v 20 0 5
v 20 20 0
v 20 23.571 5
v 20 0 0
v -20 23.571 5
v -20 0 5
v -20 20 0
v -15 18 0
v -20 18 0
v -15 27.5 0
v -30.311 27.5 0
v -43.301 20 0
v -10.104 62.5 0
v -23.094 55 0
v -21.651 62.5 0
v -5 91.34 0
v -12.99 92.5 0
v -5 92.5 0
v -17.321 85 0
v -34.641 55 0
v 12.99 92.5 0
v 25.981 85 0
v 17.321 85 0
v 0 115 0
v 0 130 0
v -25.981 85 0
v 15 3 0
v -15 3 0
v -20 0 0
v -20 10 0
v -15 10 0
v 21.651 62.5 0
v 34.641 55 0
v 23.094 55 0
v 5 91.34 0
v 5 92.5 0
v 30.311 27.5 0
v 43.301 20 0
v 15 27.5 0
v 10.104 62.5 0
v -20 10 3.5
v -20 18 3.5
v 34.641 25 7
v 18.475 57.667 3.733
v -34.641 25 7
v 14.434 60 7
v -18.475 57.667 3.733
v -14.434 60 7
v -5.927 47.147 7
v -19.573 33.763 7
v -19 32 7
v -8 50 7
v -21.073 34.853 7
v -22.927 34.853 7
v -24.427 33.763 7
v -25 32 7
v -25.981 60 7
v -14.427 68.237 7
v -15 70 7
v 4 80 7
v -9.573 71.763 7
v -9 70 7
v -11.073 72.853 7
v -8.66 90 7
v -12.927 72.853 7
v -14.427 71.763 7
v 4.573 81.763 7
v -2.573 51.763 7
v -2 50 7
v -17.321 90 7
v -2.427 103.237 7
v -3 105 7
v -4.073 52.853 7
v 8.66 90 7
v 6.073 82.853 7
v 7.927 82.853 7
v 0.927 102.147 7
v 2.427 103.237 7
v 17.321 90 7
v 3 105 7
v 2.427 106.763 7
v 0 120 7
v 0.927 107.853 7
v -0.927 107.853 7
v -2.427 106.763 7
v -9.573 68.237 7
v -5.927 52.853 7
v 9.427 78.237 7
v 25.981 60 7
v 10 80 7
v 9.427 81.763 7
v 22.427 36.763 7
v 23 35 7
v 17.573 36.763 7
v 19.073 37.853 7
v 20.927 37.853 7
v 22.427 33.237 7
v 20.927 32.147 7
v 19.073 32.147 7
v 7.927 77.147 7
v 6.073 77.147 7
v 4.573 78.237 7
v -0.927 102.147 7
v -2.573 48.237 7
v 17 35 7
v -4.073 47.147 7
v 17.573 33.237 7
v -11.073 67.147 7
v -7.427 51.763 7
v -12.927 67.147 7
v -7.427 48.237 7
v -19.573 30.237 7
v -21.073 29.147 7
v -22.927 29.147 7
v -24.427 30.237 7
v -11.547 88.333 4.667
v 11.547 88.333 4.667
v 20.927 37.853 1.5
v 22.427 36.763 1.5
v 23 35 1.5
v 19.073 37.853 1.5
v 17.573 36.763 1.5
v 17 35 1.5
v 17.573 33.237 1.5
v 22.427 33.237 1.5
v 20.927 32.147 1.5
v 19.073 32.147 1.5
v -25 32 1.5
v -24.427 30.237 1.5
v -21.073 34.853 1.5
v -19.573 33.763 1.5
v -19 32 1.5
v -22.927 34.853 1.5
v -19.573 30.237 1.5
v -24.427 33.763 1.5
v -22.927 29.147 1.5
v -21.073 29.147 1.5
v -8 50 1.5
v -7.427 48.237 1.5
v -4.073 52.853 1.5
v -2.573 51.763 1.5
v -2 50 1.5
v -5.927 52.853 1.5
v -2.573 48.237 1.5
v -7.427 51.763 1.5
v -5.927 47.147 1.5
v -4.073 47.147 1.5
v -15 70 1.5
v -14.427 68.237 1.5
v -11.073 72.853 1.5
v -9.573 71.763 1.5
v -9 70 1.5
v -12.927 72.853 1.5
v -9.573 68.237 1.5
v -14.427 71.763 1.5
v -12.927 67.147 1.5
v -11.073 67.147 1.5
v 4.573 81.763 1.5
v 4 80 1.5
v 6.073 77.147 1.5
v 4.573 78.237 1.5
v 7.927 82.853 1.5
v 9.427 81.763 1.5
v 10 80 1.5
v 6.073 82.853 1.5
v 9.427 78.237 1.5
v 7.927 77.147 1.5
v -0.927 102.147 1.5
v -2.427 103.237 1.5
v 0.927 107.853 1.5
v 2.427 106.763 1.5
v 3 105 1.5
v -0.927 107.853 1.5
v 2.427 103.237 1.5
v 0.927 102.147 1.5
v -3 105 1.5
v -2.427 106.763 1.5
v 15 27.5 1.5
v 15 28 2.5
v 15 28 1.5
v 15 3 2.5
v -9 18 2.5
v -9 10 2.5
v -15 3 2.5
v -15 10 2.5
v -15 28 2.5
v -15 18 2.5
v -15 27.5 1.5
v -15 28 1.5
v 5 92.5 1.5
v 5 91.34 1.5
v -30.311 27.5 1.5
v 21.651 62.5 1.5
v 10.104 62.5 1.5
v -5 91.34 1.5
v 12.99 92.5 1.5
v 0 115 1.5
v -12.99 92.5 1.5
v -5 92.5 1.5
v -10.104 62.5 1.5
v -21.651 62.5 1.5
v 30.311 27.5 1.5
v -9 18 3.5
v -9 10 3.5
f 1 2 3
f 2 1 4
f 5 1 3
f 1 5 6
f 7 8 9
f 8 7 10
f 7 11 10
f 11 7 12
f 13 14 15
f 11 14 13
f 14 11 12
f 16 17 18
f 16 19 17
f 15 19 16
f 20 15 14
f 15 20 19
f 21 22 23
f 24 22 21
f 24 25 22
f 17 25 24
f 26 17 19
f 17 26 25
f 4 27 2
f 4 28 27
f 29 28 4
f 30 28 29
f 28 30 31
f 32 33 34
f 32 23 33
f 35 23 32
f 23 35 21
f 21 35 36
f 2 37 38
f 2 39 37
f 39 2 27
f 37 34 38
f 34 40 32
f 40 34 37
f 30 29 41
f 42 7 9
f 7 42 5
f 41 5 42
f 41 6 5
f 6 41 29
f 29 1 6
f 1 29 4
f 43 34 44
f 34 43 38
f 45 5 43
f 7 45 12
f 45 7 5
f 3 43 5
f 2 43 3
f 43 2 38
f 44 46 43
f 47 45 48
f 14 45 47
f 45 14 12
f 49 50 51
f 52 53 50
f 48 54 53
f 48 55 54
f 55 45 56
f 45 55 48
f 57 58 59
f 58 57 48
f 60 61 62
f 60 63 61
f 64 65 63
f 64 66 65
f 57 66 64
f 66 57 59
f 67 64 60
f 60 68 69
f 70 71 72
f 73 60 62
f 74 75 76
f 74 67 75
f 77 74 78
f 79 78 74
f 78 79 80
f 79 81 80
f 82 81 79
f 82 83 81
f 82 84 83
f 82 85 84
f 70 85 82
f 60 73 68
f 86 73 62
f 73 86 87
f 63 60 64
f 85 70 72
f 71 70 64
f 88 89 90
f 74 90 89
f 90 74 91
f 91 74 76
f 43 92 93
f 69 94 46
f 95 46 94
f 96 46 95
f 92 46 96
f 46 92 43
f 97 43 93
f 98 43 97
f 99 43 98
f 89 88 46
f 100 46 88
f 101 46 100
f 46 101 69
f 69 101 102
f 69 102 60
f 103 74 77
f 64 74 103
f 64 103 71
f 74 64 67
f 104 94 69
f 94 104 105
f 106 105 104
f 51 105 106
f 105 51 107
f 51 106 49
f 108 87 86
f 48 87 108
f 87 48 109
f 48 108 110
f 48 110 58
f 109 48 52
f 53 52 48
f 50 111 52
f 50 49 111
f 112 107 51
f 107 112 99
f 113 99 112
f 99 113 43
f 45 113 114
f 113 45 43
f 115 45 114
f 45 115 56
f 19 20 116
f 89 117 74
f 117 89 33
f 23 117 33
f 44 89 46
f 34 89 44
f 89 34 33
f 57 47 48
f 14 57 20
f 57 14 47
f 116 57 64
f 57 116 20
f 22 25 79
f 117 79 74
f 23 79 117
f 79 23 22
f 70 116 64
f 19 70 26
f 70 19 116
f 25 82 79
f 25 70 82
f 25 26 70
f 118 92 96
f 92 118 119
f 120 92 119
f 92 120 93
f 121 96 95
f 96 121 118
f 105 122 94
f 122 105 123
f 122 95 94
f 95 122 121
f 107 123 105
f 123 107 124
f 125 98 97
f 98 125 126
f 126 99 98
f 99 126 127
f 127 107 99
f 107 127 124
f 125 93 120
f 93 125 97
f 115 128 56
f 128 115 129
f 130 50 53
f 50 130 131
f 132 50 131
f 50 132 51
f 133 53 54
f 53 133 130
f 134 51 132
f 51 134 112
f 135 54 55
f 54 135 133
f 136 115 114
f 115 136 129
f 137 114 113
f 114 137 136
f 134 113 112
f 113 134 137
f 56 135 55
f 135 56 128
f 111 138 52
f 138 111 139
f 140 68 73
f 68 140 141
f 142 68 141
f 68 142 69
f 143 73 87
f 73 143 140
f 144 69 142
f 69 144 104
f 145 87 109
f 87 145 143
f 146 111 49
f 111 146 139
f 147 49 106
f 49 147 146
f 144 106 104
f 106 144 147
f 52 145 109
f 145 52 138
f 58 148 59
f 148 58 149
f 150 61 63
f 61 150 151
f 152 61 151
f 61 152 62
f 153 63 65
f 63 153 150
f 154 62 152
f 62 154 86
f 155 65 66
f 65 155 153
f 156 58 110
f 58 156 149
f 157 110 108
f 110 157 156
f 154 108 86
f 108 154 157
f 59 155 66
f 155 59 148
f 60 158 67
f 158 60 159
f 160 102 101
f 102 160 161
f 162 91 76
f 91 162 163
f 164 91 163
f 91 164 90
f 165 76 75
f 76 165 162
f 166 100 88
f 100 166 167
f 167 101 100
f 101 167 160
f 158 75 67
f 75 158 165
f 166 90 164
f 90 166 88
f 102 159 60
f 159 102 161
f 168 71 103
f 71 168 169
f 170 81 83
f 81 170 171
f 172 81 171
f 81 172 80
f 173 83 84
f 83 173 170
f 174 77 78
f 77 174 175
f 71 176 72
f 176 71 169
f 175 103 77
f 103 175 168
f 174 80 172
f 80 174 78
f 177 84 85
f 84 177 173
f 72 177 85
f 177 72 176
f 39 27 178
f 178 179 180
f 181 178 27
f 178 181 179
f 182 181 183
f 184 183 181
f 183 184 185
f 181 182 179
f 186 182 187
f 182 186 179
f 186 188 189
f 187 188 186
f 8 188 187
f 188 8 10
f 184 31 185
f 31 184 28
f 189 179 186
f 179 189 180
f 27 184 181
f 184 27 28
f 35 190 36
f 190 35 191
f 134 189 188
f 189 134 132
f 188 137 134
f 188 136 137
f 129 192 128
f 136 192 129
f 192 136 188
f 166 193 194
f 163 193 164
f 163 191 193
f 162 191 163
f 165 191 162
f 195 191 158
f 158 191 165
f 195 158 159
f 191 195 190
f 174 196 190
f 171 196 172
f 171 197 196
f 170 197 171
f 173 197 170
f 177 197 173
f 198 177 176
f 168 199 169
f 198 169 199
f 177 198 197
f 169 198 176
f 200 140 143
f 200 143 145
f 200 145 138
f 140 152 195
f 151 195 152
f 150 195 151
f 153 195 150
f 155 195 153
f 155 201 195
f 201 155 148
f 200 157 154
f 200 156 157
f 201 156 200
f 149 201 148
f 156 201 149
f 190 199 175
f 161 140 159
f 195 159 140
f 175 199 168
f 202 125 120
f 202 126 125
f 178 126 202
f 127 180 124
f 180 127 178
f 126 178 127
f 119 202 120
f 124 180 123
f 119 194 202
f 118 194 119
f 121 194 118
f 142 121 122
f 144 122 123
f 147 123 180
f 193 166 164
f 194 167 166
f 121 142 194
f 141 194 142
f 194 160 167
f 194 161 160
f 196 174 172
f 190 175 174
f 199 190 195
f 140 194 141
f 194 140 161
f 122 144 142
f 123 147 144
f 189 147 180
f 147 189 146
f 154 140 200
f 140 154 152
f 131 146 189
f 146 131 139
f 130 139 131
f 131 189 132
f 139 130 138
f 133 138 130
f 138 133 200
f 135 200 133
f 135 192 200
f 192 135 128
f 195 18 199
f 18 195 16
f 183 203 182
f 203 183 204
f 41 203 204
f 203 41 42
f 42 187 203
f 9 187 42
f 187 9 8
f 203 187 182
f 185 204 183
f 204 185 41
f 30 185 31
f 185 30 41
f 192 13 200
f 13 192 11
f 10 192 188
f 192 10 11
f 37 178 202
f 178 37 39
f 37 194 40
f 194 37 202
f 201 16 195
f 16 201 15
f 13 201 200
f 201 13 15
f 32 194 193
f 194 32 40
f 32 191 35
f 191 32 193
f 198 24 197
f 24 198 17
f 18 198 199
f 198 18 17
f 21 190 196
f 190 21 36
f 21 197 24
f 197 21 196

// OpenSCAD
thickness_top = 7;
thickness_stem = thickness_top - 2;

depth_cutout = 2.5;
coutout_h = depth_cutout+1;


difference(){
    union(){
        translate([-20,0,0])
        {
            cube([40,35,thickness_stem]);
        }

        translate([-20 +20,45,0])
        {
            rotate([0,0,90])
            {
                cylinder(thickness_top,50,40,$fn=3);
            }
        }

        translate([-20 +20,45+30,0])
        {
            rotate([0,0,90])
            {
                cylinder(thickness_top,40,30,$fn=3);
            }
        }

        translate([-20 +20,45+30+25,0])
        {
            rotate([0,0,90])
            {
                cylinder(thickness_top,30,20,$fn=3);
            }
        }
    }
    union(){
        
        translate([20,35,-1]){
            cylinder(h = 8, r = 3);
        }
        
        translate([-22,32,-1]){
            cylinder(h = 8, r = 3);
        }
        
        translate([-5,50,-1]){
            cylinder(h = 8, r = 3);
        }
        
        translate([-12,70,-1]){
            cylinder(h = 8, r = 3);
        }
        
        translate([7,80,-1]){
            cylinder(h = 8, r = 3);
        }
        
        translate([0,105,-1]){
            cylinder(h = 8, r = 3);
        }
        
        translate([-15,3,-1])
        {
            cube([30,25,coutout_h]);
        }
        
        translate([-5,3,-1])
        {
            cube([10,100,coutout_h-1]);
        }
        
        translate([-21,10,-1])
        {
            cube([12,8,coutout_h+1]);
        }
        
        translate([-20 +20,45,-1])
        {
            rotate([0,0,90])
            {
                cylinder(coutout_h-1,35,35,$fn=3);
            }
        }
        
        translate([-20 +20,45+30,-1])
        {
            rotate([0,0,90])
            {
                cylinder(coutout_h-1,25,25,$fn=3);
            }
        }
        
        translate([-20 +20,45+30+25,-1])
        {
            rotate([0,0,90])
            {
                cylinder(coutout_h-1,15,15,$fn=3);
            }
        }
    }
}
